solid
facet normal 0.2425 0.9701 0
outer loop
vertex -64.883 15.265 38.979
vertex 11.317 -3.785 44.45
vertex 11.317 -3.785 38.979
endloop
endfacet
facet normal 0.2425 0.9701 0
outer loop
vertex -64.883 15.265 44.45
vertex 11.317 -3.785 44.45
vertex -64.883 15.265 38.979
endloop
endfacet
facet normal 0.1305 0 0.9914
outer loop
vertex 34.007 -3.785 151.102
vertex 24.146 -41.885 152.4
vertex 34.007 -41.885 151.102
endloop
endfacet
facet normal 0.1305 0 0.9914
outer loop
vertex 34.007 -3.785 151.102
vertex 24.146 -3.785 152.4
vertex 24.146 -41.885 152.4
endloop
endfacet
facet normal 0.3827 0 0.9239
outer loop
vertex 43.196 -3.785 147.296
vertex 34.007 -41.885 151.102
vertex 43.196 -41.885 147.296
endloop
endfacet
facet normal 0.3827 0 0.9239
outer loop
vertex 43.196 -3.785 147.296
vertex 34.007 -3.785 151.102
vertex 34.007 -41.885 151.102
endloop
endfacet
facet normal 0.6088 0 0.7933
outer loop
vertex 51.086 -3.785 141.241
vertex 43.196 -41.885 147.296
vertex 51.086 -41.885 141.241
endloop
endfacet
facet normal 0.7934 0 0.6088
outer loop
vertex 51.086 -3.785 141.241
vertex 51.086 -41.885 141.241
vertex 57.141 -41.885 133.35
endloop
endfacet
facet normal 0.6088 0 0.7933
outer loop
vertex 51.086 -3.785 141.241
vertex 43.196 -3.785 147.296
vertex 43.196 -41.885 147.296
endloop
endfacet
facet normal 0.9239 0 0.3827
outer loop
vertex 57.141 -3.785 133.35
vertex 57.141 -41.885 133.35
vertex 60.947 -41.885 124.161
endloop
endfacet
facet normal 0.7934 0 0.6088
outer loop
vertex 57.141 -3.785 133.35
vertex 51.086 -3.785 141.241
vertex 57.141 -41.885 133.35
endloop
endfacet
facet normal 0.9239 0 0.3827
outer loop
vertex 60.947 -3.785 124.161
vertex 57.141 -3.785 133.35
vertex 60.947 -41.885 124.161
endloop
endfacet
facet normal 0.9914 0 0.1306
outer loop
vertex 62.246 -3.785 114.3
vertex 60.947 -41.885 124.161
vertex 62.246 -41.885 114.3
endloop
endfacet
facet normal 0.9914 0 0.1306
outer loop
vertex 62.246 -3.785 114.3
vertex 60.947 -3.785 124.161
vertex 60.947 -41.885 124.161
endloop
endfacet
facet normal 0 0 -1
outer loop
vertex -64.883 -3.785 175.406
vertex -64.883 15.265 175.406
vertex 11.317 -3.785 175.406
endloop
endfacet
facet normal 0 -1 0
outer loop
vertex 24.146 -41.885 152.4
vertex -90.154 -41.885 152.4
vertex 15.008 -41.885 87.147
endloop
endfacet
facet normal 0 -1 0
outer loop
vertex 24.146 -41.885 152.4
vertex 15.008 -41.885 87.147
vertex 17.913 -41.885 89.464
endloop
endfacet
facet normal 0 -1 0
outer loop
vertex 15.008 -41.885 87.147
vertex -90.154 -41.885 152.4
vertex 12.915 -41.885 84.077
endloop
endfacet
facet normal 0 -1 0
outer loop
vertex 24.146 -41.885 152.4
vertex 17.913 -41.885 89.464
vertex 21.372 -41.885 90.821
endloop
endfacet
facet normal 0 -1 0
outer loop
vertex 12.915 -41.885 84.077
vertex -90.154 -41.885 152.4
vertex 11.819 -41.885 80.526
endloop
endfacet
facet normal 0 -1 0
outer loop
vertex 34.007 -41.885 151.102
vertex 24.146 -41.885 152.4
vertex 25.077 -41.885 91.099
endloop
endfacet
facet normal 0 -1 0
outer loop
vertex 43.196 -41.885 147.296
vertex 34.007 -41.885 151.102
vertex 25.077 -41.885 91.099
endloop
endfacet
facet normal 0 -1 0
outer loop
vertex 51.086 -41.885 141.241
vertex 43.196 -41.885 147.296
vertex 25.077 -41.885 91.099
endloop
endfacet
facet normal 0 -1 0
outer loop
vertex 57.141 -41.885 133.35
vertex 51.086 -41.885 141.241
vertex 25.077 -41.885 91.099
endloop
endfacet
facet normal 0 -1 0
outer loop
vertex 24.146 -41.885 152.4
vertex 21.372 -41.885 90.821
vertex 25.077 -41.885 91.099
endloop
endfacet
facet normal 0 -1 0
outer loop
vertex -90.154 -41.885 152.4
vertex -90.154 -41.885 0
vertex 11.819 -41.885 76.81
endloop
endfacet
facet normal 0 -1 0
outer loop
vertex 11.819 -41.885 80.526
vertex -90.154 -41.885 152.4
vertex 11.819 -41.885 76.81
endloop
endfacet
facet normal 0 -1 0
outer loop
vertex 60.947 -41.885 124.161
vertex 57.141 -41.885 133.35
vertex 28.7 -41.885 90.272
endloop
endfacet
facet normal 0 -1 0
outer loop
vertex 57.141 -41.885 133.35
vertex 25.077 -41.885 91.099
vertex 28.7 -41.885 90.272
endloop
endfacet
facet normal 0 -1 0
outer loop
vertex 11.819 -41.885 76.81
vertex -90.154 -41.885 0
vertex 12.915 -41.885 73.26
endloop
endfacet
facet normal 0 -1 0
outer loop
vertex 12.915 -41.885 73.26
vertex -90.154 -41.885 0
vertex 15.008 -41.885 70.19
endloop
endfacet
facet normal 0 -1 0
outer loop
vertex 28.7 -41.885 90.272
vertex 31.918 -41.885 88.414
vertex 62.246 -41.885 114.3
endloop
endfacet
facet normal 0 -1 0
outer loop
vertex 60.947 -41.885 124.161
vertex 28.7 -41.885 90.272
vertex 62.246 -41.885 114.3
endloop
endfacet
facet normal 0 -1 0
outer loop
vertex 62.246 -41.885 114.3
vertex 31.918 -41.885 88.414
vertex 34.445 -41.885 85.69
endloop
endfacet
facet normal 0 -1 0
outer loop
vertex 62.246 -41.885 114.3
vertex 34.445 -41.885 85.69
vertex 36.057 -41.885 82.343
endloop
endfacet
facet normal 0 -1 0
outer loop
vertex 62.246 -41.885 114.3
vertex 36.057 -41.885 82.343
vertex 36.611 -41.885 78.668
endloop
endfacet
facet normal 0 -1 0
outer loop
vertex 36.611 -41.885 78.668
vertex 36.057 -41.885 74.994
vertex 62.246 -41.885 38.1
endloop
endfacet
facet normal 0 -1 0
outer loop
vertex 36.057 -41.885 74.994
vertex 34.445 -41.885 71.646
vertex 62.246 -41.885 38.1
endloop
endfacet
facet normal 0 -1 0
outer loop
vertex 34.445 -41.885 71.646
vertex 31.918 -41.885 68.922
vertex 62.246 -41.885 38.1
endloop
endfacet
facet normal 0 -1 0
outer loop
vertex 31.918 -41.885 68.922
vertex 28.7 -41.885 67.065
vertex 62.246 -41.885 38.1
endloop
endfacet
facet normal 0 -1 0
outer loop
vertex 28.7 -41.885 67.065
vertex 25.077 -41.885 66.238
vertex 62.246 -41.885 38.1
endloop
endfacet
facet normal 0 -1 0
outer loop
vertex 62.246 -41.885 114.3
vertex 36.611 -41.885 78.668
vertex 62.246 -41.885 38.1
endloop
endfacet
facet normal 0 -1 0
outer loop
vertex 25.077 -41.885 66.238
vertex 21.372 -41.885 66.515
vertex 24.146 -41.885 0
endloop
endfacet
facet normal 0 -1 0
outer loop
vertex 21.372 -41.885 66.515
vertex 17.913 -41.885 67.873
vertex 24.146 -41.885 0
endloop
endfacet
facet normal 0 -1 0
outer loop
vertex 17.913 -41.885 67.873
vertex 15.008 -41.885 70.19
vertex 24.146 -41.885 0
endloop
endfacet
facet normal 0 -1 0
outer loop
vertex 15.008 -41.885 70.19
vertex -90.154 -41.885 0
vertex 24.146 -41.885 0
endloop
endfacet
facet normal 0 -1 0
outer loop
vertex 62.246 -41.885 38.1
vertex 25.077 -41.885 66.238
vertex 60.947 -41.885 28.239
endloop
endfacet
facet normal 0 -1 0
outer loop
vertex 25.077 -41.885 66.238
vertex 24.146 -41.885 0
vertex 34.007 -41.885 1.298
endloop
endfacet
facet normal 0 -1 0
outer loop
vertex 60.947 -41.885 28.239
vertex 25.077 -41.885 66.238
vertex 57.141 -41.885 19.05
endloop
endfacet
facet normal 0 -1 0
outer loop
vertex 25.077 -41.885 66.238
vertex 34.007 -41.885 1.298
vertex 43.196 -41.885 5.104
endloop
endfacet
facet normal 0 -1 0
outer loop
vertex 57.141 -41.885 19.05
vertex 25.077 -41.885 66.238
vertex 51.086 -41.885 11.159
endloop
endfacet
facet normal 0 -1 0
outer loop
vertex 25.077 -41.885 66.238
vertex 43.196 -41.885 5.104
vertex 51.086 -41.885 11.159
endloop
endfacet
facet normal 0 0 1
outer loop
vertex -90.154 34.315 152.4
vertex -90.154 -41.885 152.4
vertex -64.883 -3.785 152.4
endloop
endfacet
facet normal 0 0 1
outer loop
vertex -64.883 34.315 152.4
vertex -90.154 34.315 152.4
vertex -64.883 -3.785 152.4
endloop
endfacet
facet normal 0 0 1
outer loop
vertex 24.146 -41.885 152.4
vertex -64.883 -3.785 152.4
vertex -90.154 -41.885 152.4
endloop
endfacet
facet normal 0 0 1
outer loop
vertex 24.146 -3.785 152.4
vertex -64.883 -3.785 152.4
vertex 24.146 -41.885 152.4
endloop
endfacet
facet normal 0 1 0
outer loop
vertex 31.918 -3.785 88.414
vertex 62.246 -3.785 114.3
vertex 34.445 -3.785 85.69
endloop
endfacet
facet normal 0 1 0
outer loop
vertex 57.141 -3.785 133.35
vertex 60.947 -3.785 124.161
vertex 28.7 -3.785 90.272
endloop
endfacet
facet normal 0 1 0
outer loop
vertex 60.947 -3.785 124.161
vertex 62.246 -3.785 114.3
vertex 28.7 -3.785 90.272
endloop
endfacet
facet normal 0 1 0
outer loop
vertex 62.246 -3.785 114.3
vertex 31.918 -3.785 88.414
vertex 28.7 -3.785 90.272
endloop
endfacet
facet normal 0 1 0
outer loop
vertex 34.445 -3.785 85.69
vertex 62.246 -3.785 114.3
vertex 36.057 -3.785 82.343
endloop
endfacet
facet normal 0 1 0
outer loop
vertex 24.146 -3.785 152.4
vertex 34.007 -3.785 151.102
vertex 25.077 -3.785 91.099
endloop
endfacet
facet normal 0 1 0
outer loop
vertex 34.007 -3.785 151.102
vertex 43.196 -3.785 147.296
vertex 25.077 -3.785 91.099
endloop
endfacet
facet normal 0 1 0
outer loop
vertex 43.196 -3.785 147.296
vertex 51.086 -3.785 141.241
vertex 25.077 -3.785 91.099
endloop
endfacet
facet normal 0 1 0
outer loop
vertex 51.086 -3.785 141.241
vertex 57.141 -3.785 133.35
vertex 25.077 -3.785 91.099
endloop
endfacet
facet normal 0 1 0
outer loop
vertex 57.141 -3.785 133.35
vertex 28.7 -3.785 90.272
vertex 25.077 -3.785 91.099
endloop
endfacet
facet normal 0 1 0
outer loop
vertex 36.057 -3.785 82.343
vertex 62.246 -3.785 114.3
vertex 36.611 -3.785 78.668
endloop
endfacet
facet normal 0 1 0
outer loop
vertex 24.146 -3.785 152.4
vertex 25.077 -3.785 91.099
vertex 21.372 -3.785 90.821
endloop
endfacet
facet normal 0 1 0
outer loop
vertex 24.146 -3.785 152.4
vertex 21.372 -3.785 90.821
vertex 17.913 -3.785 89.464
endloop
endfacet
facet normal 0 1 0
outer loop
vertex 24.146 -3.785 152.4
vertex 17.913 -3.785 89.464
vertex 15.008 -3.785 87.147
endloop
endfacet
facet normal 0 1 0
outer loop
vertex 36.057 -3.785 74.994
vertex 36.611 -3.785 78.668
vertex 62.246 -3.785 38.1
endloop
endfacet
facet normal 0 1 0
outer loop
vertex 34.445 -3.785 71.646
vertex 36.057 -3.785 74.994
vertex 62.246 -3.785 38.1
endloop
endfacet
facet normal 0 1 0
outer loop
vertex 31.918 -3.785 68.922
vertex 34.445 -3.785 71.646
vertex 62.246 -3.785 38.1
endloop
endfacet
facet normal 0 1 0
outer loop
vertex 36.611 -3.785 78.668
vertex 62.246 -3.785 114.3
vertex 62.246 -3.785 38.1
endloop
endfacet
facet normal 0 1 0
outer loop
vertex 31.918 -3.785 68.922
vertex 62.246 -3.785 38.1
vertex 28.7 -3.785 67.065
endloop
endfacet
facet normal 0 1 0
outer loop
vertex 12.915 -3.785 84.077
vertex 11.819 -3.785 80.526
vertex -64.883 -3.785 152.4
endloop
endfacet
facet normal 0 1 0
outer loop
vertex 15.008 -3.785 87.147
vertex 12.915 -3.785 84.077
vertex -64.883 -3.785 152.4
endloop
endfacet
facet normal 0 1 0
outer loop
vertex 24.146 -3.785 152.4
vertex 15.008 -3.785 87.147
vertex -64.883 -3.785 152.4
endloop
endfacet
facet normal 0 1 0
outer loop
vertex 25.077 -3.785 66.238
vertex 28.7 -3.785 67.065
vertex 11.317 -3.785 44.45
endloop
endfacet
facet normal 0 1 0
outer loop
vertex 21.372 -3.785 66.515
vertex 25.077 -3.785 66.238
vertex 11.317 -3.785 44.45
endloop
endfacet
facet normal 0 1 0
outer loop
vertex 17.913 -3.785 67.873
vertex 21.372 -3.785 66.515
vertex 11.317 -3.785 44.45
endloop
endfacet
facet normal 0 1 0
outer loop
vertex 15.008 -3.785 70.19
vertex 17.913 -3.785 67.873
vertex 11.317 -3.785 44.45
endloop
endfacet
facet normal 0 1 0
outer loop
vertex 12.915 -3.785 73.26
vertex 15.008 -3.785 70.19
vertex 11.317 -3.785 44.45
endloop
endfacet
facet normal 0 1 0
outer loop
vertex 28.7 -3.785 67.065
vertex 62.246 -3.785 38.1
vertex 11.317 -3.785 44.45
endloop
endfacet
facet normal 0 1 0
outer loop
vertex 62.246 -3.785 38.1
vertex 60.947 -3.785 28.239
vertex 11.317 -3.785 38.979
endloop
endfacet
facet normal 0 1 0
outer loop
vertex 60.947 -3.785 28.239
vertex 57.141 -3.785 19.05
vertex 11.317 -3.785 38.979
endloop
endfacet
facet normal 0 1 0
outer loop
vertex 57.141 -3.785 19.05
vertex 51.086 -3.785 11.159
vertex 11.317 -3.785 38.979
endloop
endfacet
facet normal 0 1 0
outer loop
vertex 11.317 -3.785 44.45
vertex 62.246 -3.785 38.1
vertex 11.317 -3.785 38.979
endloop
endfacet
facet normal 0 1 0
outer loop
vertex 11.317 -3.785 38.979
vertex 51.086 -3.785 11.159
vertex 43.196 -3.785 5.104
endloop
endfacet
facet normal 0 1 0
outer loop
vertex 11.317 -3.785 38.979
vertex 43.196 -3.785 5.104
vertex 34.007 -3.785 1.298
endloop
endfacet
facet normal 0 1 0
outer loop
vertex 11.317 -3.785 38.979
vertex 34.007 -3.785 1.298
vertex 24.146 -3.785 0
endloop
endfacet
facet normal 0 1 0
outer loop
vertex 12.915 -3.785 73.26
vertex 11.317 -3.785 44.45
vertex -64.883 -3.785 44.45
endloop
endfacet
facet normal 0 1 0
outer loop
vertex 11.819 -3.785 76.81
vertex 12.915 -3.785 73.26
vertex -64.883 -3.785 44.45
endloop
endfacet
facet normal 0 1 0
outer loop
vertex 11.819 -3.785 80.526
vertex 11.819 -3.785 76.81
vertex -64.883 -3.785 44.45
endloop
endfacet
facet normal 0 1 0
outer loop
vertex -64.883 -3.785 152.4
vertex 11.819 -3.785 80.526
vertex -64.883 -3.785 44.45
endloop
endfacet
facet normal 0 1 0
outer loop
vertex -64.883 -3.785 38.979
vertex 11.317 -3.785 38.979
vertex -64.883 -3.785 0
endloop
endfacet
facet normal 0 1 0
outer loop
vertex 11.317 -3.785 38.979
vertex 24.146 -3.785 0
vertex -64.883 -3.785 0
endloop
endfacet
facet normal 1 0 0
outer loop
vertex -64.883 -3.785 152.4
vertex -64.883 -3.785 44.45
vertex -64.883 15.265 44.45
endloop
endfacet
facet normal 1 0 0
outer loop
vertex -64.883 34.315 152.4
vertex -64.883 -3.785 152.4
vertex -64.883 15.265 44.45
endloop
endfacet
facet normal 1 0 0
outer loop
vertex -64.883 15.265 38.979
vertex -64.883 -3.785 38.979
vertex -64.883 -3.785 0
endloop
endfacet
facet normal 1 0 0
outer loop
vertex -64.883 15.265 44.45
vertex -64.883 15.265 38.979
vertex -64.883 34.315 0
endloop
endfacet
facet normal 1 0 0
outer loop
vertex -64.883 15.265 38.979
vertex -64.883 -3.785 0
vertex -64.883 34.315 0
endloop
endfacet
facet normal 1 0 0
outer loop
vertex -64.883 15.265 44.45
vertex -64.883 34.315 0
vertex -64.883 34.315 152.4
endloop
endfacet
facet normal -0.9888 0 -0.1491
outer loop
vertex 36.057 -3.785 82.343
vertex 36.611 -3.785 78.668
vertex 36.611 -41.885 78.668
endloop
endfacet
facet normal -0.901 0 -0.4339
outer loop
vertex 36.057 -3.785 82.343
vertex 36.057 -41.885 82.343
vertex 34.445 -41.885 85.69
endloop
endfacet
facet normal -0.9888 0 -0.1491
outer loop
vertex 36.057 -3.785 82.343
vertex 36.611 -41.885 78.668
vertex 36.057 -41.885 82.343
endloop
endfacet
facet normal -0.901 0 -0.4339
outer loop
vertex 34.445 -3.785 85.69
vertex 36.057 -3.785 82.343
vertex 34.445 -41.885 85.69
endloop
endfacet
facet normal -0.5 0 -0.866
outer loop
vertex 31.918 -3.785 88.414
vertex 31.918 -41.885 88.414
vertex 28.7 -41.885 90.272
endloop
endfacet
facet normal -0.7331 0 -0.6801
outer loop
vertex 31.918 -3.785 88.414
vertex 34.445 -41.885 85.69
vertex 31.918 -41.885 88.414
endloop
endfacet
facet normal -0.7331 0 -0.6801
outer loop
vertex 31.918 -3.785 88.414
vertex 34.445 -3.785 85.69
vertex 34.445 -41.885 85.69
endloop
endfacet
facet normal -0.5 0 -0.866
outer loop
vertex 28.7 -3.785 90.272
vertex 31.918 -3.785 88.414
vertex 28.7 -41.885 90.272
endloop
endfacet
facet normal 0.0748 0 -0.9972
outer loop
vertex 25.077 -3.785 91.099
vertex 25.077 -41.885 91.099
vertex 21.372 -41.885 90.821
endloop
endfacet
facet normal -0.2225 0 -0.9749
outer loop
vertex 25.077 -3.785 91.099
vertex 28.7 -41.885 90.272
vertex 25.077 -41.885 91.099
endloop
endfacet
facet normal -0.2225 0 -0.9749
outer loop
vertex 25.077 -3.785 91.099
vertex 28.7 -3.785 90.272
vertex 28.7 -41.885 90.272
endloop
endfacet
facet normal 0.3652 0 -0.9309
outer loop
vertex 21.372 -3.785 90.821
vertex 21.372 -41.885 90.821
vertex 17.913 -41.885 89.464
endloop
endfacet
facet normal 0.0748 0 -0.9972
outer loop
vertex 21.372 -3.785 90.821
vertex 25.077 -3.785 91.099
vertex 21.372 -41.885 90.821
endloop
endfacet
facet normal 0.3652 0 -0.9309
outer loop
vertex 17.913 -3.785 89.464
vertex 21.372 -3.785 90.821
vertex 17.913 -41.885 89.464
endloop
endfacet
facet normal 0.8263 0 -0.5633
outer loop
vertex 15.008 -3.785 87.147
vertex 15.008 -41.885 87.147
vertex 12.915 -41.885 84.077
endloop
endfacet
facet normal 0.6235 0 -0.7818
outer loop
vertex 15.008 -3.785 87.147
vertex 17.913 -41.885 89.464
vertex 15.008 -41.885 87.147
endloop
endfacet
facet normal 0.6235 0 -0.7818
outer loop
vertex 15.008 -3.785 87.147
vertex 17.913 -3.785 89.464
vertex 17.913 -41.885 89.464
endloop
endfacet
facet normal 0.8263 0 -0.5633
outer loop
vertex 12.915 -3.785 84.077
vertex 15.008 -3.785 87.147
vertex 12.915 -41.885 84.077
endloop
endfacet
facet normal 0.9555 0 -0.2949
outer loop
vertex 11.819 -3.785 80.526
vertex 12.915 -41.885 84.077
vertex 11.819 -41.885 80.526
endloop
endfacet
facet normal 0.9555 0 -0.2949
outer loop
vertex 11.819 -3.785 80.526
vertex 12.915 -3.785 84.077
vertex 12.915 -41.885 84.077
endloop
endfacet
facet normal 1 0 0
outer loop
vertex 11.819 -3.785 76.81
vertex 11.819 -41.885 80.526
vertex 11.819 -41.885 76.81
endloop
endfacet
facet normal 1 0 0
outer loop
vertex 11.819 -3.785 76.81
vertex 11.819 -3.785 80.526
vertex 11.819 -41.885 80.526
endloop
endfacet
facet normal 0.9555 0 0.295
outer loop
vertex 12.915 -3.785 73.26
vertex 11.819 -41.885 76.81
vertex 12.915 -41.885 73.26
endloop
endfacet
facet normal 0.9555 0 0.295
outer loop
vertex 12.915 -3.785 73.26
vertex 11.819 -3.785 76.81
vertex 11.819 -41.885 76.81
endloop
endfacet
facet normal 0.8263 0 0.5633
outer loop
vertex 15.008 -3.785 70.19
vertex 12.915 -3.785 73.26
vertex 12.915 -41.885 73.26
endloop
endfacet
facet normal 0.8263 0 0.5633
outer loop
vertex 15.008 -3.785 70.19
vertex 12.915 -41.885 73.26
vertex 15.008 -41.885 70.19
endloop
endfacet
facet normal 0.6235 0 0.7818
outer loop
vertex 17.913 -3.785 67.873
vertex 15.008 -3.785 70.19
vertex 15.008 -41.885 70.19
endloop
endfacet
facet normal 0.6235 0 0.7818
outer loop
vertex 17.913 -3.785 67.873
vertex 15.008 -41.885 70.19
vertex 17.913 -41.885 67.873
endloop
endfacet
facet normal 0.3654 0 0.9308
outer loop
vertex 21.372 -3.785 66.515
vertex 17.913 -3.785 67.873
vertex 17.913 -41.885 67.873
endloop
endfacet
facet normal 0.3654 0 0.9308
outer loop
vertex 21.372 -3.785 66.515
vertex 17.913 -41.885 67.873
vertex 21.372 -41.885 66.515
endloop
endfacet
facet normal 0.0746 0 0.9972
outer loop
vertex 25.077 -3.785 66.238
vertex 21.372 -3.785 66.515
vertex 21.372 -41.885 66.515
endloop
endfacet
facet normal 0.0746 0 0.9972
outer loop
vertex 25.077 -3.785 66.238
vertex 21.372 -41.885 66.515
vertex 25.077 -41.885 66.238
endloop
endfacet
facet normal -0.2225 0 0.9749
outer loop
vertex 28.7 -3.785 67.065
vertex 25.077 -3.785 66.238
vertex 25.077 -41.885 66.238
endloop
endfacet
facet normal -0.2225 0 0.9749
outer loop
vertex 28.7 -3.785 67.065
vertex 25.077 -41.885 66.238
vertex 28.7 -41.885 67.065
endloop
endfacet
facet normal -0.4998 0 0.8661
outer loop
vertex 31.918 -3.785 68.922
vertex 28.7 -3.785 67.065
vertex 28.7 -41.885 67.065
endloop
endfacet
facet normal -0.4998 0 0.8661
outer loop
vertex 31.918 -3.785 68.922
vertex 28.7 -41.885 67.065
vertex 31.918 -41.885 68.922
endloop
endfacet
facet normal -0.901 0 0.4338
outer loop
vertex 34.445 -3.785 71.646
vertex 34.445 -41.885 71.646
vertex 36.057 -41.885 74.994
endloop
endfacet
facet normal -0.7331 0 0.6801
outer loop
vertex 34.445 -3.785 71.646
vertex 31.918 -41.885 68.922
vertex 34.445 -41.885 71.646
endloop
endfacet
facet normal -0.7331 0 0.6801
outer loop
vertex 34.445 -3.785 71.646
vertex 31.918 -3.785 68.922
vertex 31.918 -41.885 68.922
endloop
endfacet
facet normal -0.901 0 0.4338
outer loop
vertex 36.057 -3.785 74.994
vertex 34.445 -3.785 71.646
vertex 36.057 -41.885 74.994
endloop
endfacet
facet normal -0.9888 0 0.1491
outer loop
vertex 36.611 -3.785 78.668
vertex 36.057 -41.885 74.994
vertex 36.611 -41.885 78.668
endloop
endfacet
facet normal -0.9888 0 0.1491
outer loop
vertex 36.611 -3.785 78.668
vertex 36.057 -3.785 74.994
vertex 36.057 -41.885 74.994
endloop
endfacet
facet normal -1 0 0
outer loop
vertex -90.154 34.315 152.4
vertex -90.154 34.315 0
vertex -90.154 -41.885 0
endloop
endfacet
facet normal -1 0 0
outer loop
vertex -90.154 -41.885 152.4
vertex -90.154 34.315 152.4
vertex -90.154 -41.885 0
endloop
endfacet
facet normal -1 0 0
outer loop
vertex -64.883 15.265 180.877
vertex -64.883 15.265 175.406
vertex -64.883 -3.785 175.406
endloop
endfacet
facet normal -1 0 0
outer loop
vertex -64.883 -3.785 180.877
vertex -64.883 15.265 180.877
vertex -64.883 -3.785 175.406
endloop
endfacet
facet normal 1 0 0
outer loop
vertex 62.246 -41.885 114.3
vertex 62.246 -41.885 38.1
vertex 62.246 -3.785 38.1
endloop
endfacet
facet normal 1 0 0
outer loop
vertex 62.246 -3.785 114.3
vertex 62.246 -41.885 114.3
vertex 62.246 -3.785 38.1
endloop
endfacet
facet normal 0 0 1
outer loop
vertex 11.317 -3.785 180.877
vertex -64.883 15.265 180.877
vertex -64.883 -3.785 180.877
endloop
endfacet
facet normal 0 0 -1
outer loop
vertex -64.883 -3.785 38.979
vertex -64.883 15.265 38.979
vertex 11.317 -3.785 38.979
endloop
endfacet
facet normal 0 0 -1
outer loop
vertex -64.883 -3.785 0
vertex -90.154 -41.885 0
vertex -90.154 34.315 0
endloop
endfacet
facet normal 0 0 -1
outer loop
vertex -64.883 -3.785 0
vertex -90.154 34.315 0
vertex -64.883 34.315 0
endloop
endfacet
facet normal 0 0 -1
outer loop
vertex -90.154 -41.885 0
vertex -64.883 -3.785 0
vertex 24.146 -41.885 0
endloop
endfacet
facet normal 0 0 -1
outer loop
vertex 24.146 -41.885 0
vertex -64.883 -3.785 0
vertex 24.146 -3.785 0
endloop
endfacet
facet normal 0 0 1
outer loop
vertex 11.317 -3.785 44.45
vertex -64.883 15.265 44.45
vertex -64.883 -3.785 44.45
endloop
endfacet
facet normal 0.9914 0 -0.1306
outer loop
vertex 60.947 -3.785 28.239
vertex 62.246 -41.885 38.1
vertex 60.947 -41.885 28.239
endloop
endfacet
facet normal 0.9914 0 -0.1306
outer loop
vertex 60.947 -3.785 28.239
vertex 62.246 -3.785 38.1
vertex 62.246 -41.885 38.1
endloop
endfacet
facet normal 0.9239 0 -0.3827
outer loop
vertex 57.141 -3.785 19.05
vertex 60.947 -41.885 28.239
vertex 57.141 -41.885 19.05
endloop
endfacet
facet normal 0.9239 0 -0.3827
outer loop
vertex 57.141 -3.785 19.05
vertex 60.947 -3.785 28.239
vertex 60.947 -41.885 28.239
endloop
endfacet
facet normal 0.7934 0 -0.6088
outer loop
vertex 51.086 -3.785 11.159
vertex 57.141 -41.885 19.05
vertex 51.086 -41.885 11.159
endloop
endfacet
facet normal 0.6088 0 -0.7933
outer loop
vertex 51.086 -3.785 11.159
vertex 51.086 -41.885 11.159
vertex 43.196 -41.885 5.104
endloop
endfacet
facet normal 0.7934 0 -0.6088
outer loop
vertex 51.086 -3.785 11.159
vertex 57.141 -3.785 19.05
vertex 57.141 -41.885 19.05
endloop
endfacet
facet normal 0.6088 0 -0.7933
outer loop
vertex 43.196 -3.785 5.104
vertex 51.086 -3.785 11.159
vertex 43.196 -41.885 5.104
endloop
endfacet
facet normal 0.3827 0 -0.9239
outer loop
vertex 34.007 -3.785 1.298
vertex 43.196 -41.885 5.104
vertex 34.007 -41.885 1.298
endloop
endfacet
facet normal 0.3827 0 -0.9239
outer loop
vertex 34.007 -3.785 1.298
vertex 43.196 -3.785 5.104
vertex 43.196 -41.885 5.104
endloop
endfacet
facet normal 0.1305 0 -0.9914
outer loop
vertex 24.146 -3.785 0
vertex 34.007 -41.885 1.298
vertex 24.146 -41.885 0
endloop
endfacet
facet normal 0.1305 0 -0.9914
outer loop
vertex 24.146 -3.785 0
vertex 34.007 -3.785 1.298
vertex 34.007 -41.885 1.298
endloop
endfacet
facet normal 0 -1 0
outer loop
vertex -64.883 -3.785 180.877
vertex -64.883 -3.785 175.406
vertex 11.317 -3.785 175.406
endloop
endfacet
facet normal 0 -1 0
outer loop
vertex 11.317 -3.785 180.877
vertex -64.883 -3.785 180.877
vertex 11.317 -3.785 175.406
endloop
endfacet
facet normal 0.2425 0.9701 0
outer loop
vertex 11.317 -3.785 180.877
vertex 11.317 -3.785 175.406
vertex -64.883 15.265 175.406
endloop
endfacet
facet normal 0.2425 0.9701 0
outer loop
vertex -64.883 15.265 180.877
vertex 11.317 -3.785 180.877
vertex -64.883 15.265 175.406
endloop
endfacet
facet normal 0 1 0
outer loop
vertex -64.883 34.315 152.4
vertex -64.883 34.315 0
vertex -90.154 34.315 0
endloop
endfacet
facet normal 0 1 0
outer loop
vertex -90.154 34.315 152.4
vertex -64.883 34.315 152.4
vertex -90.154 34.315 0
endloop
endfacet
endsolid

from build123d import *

# Parameters (mm, degrees)
F1_DEPTH = 152.4
F2_R     = 12.4654374507
F3_DEPTH = 41.8860476801
F4_R     = 38.1
F5_R     = 38.1
F8_DEPTH = 5.4713543504


# Not quite as in the source:
# - a pattern or mirror of a feature is missing from the dataset's text; its kind, count and spacing are read off the source's solid


with BuildPart() as f1:
    # F0 (on Top) → F1 (new body)
    with BuildSketch(Plane.XY):
        Polygon((-64.8825142378, 34.3149523199), (-90.1543280485, 34.3149523199), (-90.1543280485, -41.8850476801), (62.2456719515, -41.8850476801), (62.2456719515, -3.7850476801), (-64.8825142378, -3.7850476801), align=None)
    extrude(amount=F1_DEPTH)

    # F2 (on Front) → F3 (cut, through all)
    with BuildSketch(Plane.XZ):
        with Locations((24.1456719515, 78.66833359)):
            Circle(F2_R)
    extrude(amount=F3_DEPTH, mode=Mode.SUBTRACT)

    # F4
    f4_edges = [f1.edges().sort_by_distance(p)[0] for p in [
        (62.245672, -22.835048, 152.4),
    ]]
    fillet(f4_edges, radius=F4_R)

    # F5
    f5_edges = [f1.edges().sort_by_distance(p)[0] for p in [
        (62.245672, -22.835048, 0),
    ]]
    fillet(f5_edges, radius=F5_R)

    # F7 (on offset) → F8 (join)
    with BuildSketch(Plane.XY.offset(44.45)):
        Polygon((-64.8825142378, -3.7850476801), (11.3174857622, -3.7850476801), (-64.8825142378, 15.2649523199), align=None)
    f8 = extrude(amount=-F8_DEPTH)

    # F8_copies: F8 across plane
    add(f8.mirror(Plane.XY.offset(109.927885)))


solid = f1.part
